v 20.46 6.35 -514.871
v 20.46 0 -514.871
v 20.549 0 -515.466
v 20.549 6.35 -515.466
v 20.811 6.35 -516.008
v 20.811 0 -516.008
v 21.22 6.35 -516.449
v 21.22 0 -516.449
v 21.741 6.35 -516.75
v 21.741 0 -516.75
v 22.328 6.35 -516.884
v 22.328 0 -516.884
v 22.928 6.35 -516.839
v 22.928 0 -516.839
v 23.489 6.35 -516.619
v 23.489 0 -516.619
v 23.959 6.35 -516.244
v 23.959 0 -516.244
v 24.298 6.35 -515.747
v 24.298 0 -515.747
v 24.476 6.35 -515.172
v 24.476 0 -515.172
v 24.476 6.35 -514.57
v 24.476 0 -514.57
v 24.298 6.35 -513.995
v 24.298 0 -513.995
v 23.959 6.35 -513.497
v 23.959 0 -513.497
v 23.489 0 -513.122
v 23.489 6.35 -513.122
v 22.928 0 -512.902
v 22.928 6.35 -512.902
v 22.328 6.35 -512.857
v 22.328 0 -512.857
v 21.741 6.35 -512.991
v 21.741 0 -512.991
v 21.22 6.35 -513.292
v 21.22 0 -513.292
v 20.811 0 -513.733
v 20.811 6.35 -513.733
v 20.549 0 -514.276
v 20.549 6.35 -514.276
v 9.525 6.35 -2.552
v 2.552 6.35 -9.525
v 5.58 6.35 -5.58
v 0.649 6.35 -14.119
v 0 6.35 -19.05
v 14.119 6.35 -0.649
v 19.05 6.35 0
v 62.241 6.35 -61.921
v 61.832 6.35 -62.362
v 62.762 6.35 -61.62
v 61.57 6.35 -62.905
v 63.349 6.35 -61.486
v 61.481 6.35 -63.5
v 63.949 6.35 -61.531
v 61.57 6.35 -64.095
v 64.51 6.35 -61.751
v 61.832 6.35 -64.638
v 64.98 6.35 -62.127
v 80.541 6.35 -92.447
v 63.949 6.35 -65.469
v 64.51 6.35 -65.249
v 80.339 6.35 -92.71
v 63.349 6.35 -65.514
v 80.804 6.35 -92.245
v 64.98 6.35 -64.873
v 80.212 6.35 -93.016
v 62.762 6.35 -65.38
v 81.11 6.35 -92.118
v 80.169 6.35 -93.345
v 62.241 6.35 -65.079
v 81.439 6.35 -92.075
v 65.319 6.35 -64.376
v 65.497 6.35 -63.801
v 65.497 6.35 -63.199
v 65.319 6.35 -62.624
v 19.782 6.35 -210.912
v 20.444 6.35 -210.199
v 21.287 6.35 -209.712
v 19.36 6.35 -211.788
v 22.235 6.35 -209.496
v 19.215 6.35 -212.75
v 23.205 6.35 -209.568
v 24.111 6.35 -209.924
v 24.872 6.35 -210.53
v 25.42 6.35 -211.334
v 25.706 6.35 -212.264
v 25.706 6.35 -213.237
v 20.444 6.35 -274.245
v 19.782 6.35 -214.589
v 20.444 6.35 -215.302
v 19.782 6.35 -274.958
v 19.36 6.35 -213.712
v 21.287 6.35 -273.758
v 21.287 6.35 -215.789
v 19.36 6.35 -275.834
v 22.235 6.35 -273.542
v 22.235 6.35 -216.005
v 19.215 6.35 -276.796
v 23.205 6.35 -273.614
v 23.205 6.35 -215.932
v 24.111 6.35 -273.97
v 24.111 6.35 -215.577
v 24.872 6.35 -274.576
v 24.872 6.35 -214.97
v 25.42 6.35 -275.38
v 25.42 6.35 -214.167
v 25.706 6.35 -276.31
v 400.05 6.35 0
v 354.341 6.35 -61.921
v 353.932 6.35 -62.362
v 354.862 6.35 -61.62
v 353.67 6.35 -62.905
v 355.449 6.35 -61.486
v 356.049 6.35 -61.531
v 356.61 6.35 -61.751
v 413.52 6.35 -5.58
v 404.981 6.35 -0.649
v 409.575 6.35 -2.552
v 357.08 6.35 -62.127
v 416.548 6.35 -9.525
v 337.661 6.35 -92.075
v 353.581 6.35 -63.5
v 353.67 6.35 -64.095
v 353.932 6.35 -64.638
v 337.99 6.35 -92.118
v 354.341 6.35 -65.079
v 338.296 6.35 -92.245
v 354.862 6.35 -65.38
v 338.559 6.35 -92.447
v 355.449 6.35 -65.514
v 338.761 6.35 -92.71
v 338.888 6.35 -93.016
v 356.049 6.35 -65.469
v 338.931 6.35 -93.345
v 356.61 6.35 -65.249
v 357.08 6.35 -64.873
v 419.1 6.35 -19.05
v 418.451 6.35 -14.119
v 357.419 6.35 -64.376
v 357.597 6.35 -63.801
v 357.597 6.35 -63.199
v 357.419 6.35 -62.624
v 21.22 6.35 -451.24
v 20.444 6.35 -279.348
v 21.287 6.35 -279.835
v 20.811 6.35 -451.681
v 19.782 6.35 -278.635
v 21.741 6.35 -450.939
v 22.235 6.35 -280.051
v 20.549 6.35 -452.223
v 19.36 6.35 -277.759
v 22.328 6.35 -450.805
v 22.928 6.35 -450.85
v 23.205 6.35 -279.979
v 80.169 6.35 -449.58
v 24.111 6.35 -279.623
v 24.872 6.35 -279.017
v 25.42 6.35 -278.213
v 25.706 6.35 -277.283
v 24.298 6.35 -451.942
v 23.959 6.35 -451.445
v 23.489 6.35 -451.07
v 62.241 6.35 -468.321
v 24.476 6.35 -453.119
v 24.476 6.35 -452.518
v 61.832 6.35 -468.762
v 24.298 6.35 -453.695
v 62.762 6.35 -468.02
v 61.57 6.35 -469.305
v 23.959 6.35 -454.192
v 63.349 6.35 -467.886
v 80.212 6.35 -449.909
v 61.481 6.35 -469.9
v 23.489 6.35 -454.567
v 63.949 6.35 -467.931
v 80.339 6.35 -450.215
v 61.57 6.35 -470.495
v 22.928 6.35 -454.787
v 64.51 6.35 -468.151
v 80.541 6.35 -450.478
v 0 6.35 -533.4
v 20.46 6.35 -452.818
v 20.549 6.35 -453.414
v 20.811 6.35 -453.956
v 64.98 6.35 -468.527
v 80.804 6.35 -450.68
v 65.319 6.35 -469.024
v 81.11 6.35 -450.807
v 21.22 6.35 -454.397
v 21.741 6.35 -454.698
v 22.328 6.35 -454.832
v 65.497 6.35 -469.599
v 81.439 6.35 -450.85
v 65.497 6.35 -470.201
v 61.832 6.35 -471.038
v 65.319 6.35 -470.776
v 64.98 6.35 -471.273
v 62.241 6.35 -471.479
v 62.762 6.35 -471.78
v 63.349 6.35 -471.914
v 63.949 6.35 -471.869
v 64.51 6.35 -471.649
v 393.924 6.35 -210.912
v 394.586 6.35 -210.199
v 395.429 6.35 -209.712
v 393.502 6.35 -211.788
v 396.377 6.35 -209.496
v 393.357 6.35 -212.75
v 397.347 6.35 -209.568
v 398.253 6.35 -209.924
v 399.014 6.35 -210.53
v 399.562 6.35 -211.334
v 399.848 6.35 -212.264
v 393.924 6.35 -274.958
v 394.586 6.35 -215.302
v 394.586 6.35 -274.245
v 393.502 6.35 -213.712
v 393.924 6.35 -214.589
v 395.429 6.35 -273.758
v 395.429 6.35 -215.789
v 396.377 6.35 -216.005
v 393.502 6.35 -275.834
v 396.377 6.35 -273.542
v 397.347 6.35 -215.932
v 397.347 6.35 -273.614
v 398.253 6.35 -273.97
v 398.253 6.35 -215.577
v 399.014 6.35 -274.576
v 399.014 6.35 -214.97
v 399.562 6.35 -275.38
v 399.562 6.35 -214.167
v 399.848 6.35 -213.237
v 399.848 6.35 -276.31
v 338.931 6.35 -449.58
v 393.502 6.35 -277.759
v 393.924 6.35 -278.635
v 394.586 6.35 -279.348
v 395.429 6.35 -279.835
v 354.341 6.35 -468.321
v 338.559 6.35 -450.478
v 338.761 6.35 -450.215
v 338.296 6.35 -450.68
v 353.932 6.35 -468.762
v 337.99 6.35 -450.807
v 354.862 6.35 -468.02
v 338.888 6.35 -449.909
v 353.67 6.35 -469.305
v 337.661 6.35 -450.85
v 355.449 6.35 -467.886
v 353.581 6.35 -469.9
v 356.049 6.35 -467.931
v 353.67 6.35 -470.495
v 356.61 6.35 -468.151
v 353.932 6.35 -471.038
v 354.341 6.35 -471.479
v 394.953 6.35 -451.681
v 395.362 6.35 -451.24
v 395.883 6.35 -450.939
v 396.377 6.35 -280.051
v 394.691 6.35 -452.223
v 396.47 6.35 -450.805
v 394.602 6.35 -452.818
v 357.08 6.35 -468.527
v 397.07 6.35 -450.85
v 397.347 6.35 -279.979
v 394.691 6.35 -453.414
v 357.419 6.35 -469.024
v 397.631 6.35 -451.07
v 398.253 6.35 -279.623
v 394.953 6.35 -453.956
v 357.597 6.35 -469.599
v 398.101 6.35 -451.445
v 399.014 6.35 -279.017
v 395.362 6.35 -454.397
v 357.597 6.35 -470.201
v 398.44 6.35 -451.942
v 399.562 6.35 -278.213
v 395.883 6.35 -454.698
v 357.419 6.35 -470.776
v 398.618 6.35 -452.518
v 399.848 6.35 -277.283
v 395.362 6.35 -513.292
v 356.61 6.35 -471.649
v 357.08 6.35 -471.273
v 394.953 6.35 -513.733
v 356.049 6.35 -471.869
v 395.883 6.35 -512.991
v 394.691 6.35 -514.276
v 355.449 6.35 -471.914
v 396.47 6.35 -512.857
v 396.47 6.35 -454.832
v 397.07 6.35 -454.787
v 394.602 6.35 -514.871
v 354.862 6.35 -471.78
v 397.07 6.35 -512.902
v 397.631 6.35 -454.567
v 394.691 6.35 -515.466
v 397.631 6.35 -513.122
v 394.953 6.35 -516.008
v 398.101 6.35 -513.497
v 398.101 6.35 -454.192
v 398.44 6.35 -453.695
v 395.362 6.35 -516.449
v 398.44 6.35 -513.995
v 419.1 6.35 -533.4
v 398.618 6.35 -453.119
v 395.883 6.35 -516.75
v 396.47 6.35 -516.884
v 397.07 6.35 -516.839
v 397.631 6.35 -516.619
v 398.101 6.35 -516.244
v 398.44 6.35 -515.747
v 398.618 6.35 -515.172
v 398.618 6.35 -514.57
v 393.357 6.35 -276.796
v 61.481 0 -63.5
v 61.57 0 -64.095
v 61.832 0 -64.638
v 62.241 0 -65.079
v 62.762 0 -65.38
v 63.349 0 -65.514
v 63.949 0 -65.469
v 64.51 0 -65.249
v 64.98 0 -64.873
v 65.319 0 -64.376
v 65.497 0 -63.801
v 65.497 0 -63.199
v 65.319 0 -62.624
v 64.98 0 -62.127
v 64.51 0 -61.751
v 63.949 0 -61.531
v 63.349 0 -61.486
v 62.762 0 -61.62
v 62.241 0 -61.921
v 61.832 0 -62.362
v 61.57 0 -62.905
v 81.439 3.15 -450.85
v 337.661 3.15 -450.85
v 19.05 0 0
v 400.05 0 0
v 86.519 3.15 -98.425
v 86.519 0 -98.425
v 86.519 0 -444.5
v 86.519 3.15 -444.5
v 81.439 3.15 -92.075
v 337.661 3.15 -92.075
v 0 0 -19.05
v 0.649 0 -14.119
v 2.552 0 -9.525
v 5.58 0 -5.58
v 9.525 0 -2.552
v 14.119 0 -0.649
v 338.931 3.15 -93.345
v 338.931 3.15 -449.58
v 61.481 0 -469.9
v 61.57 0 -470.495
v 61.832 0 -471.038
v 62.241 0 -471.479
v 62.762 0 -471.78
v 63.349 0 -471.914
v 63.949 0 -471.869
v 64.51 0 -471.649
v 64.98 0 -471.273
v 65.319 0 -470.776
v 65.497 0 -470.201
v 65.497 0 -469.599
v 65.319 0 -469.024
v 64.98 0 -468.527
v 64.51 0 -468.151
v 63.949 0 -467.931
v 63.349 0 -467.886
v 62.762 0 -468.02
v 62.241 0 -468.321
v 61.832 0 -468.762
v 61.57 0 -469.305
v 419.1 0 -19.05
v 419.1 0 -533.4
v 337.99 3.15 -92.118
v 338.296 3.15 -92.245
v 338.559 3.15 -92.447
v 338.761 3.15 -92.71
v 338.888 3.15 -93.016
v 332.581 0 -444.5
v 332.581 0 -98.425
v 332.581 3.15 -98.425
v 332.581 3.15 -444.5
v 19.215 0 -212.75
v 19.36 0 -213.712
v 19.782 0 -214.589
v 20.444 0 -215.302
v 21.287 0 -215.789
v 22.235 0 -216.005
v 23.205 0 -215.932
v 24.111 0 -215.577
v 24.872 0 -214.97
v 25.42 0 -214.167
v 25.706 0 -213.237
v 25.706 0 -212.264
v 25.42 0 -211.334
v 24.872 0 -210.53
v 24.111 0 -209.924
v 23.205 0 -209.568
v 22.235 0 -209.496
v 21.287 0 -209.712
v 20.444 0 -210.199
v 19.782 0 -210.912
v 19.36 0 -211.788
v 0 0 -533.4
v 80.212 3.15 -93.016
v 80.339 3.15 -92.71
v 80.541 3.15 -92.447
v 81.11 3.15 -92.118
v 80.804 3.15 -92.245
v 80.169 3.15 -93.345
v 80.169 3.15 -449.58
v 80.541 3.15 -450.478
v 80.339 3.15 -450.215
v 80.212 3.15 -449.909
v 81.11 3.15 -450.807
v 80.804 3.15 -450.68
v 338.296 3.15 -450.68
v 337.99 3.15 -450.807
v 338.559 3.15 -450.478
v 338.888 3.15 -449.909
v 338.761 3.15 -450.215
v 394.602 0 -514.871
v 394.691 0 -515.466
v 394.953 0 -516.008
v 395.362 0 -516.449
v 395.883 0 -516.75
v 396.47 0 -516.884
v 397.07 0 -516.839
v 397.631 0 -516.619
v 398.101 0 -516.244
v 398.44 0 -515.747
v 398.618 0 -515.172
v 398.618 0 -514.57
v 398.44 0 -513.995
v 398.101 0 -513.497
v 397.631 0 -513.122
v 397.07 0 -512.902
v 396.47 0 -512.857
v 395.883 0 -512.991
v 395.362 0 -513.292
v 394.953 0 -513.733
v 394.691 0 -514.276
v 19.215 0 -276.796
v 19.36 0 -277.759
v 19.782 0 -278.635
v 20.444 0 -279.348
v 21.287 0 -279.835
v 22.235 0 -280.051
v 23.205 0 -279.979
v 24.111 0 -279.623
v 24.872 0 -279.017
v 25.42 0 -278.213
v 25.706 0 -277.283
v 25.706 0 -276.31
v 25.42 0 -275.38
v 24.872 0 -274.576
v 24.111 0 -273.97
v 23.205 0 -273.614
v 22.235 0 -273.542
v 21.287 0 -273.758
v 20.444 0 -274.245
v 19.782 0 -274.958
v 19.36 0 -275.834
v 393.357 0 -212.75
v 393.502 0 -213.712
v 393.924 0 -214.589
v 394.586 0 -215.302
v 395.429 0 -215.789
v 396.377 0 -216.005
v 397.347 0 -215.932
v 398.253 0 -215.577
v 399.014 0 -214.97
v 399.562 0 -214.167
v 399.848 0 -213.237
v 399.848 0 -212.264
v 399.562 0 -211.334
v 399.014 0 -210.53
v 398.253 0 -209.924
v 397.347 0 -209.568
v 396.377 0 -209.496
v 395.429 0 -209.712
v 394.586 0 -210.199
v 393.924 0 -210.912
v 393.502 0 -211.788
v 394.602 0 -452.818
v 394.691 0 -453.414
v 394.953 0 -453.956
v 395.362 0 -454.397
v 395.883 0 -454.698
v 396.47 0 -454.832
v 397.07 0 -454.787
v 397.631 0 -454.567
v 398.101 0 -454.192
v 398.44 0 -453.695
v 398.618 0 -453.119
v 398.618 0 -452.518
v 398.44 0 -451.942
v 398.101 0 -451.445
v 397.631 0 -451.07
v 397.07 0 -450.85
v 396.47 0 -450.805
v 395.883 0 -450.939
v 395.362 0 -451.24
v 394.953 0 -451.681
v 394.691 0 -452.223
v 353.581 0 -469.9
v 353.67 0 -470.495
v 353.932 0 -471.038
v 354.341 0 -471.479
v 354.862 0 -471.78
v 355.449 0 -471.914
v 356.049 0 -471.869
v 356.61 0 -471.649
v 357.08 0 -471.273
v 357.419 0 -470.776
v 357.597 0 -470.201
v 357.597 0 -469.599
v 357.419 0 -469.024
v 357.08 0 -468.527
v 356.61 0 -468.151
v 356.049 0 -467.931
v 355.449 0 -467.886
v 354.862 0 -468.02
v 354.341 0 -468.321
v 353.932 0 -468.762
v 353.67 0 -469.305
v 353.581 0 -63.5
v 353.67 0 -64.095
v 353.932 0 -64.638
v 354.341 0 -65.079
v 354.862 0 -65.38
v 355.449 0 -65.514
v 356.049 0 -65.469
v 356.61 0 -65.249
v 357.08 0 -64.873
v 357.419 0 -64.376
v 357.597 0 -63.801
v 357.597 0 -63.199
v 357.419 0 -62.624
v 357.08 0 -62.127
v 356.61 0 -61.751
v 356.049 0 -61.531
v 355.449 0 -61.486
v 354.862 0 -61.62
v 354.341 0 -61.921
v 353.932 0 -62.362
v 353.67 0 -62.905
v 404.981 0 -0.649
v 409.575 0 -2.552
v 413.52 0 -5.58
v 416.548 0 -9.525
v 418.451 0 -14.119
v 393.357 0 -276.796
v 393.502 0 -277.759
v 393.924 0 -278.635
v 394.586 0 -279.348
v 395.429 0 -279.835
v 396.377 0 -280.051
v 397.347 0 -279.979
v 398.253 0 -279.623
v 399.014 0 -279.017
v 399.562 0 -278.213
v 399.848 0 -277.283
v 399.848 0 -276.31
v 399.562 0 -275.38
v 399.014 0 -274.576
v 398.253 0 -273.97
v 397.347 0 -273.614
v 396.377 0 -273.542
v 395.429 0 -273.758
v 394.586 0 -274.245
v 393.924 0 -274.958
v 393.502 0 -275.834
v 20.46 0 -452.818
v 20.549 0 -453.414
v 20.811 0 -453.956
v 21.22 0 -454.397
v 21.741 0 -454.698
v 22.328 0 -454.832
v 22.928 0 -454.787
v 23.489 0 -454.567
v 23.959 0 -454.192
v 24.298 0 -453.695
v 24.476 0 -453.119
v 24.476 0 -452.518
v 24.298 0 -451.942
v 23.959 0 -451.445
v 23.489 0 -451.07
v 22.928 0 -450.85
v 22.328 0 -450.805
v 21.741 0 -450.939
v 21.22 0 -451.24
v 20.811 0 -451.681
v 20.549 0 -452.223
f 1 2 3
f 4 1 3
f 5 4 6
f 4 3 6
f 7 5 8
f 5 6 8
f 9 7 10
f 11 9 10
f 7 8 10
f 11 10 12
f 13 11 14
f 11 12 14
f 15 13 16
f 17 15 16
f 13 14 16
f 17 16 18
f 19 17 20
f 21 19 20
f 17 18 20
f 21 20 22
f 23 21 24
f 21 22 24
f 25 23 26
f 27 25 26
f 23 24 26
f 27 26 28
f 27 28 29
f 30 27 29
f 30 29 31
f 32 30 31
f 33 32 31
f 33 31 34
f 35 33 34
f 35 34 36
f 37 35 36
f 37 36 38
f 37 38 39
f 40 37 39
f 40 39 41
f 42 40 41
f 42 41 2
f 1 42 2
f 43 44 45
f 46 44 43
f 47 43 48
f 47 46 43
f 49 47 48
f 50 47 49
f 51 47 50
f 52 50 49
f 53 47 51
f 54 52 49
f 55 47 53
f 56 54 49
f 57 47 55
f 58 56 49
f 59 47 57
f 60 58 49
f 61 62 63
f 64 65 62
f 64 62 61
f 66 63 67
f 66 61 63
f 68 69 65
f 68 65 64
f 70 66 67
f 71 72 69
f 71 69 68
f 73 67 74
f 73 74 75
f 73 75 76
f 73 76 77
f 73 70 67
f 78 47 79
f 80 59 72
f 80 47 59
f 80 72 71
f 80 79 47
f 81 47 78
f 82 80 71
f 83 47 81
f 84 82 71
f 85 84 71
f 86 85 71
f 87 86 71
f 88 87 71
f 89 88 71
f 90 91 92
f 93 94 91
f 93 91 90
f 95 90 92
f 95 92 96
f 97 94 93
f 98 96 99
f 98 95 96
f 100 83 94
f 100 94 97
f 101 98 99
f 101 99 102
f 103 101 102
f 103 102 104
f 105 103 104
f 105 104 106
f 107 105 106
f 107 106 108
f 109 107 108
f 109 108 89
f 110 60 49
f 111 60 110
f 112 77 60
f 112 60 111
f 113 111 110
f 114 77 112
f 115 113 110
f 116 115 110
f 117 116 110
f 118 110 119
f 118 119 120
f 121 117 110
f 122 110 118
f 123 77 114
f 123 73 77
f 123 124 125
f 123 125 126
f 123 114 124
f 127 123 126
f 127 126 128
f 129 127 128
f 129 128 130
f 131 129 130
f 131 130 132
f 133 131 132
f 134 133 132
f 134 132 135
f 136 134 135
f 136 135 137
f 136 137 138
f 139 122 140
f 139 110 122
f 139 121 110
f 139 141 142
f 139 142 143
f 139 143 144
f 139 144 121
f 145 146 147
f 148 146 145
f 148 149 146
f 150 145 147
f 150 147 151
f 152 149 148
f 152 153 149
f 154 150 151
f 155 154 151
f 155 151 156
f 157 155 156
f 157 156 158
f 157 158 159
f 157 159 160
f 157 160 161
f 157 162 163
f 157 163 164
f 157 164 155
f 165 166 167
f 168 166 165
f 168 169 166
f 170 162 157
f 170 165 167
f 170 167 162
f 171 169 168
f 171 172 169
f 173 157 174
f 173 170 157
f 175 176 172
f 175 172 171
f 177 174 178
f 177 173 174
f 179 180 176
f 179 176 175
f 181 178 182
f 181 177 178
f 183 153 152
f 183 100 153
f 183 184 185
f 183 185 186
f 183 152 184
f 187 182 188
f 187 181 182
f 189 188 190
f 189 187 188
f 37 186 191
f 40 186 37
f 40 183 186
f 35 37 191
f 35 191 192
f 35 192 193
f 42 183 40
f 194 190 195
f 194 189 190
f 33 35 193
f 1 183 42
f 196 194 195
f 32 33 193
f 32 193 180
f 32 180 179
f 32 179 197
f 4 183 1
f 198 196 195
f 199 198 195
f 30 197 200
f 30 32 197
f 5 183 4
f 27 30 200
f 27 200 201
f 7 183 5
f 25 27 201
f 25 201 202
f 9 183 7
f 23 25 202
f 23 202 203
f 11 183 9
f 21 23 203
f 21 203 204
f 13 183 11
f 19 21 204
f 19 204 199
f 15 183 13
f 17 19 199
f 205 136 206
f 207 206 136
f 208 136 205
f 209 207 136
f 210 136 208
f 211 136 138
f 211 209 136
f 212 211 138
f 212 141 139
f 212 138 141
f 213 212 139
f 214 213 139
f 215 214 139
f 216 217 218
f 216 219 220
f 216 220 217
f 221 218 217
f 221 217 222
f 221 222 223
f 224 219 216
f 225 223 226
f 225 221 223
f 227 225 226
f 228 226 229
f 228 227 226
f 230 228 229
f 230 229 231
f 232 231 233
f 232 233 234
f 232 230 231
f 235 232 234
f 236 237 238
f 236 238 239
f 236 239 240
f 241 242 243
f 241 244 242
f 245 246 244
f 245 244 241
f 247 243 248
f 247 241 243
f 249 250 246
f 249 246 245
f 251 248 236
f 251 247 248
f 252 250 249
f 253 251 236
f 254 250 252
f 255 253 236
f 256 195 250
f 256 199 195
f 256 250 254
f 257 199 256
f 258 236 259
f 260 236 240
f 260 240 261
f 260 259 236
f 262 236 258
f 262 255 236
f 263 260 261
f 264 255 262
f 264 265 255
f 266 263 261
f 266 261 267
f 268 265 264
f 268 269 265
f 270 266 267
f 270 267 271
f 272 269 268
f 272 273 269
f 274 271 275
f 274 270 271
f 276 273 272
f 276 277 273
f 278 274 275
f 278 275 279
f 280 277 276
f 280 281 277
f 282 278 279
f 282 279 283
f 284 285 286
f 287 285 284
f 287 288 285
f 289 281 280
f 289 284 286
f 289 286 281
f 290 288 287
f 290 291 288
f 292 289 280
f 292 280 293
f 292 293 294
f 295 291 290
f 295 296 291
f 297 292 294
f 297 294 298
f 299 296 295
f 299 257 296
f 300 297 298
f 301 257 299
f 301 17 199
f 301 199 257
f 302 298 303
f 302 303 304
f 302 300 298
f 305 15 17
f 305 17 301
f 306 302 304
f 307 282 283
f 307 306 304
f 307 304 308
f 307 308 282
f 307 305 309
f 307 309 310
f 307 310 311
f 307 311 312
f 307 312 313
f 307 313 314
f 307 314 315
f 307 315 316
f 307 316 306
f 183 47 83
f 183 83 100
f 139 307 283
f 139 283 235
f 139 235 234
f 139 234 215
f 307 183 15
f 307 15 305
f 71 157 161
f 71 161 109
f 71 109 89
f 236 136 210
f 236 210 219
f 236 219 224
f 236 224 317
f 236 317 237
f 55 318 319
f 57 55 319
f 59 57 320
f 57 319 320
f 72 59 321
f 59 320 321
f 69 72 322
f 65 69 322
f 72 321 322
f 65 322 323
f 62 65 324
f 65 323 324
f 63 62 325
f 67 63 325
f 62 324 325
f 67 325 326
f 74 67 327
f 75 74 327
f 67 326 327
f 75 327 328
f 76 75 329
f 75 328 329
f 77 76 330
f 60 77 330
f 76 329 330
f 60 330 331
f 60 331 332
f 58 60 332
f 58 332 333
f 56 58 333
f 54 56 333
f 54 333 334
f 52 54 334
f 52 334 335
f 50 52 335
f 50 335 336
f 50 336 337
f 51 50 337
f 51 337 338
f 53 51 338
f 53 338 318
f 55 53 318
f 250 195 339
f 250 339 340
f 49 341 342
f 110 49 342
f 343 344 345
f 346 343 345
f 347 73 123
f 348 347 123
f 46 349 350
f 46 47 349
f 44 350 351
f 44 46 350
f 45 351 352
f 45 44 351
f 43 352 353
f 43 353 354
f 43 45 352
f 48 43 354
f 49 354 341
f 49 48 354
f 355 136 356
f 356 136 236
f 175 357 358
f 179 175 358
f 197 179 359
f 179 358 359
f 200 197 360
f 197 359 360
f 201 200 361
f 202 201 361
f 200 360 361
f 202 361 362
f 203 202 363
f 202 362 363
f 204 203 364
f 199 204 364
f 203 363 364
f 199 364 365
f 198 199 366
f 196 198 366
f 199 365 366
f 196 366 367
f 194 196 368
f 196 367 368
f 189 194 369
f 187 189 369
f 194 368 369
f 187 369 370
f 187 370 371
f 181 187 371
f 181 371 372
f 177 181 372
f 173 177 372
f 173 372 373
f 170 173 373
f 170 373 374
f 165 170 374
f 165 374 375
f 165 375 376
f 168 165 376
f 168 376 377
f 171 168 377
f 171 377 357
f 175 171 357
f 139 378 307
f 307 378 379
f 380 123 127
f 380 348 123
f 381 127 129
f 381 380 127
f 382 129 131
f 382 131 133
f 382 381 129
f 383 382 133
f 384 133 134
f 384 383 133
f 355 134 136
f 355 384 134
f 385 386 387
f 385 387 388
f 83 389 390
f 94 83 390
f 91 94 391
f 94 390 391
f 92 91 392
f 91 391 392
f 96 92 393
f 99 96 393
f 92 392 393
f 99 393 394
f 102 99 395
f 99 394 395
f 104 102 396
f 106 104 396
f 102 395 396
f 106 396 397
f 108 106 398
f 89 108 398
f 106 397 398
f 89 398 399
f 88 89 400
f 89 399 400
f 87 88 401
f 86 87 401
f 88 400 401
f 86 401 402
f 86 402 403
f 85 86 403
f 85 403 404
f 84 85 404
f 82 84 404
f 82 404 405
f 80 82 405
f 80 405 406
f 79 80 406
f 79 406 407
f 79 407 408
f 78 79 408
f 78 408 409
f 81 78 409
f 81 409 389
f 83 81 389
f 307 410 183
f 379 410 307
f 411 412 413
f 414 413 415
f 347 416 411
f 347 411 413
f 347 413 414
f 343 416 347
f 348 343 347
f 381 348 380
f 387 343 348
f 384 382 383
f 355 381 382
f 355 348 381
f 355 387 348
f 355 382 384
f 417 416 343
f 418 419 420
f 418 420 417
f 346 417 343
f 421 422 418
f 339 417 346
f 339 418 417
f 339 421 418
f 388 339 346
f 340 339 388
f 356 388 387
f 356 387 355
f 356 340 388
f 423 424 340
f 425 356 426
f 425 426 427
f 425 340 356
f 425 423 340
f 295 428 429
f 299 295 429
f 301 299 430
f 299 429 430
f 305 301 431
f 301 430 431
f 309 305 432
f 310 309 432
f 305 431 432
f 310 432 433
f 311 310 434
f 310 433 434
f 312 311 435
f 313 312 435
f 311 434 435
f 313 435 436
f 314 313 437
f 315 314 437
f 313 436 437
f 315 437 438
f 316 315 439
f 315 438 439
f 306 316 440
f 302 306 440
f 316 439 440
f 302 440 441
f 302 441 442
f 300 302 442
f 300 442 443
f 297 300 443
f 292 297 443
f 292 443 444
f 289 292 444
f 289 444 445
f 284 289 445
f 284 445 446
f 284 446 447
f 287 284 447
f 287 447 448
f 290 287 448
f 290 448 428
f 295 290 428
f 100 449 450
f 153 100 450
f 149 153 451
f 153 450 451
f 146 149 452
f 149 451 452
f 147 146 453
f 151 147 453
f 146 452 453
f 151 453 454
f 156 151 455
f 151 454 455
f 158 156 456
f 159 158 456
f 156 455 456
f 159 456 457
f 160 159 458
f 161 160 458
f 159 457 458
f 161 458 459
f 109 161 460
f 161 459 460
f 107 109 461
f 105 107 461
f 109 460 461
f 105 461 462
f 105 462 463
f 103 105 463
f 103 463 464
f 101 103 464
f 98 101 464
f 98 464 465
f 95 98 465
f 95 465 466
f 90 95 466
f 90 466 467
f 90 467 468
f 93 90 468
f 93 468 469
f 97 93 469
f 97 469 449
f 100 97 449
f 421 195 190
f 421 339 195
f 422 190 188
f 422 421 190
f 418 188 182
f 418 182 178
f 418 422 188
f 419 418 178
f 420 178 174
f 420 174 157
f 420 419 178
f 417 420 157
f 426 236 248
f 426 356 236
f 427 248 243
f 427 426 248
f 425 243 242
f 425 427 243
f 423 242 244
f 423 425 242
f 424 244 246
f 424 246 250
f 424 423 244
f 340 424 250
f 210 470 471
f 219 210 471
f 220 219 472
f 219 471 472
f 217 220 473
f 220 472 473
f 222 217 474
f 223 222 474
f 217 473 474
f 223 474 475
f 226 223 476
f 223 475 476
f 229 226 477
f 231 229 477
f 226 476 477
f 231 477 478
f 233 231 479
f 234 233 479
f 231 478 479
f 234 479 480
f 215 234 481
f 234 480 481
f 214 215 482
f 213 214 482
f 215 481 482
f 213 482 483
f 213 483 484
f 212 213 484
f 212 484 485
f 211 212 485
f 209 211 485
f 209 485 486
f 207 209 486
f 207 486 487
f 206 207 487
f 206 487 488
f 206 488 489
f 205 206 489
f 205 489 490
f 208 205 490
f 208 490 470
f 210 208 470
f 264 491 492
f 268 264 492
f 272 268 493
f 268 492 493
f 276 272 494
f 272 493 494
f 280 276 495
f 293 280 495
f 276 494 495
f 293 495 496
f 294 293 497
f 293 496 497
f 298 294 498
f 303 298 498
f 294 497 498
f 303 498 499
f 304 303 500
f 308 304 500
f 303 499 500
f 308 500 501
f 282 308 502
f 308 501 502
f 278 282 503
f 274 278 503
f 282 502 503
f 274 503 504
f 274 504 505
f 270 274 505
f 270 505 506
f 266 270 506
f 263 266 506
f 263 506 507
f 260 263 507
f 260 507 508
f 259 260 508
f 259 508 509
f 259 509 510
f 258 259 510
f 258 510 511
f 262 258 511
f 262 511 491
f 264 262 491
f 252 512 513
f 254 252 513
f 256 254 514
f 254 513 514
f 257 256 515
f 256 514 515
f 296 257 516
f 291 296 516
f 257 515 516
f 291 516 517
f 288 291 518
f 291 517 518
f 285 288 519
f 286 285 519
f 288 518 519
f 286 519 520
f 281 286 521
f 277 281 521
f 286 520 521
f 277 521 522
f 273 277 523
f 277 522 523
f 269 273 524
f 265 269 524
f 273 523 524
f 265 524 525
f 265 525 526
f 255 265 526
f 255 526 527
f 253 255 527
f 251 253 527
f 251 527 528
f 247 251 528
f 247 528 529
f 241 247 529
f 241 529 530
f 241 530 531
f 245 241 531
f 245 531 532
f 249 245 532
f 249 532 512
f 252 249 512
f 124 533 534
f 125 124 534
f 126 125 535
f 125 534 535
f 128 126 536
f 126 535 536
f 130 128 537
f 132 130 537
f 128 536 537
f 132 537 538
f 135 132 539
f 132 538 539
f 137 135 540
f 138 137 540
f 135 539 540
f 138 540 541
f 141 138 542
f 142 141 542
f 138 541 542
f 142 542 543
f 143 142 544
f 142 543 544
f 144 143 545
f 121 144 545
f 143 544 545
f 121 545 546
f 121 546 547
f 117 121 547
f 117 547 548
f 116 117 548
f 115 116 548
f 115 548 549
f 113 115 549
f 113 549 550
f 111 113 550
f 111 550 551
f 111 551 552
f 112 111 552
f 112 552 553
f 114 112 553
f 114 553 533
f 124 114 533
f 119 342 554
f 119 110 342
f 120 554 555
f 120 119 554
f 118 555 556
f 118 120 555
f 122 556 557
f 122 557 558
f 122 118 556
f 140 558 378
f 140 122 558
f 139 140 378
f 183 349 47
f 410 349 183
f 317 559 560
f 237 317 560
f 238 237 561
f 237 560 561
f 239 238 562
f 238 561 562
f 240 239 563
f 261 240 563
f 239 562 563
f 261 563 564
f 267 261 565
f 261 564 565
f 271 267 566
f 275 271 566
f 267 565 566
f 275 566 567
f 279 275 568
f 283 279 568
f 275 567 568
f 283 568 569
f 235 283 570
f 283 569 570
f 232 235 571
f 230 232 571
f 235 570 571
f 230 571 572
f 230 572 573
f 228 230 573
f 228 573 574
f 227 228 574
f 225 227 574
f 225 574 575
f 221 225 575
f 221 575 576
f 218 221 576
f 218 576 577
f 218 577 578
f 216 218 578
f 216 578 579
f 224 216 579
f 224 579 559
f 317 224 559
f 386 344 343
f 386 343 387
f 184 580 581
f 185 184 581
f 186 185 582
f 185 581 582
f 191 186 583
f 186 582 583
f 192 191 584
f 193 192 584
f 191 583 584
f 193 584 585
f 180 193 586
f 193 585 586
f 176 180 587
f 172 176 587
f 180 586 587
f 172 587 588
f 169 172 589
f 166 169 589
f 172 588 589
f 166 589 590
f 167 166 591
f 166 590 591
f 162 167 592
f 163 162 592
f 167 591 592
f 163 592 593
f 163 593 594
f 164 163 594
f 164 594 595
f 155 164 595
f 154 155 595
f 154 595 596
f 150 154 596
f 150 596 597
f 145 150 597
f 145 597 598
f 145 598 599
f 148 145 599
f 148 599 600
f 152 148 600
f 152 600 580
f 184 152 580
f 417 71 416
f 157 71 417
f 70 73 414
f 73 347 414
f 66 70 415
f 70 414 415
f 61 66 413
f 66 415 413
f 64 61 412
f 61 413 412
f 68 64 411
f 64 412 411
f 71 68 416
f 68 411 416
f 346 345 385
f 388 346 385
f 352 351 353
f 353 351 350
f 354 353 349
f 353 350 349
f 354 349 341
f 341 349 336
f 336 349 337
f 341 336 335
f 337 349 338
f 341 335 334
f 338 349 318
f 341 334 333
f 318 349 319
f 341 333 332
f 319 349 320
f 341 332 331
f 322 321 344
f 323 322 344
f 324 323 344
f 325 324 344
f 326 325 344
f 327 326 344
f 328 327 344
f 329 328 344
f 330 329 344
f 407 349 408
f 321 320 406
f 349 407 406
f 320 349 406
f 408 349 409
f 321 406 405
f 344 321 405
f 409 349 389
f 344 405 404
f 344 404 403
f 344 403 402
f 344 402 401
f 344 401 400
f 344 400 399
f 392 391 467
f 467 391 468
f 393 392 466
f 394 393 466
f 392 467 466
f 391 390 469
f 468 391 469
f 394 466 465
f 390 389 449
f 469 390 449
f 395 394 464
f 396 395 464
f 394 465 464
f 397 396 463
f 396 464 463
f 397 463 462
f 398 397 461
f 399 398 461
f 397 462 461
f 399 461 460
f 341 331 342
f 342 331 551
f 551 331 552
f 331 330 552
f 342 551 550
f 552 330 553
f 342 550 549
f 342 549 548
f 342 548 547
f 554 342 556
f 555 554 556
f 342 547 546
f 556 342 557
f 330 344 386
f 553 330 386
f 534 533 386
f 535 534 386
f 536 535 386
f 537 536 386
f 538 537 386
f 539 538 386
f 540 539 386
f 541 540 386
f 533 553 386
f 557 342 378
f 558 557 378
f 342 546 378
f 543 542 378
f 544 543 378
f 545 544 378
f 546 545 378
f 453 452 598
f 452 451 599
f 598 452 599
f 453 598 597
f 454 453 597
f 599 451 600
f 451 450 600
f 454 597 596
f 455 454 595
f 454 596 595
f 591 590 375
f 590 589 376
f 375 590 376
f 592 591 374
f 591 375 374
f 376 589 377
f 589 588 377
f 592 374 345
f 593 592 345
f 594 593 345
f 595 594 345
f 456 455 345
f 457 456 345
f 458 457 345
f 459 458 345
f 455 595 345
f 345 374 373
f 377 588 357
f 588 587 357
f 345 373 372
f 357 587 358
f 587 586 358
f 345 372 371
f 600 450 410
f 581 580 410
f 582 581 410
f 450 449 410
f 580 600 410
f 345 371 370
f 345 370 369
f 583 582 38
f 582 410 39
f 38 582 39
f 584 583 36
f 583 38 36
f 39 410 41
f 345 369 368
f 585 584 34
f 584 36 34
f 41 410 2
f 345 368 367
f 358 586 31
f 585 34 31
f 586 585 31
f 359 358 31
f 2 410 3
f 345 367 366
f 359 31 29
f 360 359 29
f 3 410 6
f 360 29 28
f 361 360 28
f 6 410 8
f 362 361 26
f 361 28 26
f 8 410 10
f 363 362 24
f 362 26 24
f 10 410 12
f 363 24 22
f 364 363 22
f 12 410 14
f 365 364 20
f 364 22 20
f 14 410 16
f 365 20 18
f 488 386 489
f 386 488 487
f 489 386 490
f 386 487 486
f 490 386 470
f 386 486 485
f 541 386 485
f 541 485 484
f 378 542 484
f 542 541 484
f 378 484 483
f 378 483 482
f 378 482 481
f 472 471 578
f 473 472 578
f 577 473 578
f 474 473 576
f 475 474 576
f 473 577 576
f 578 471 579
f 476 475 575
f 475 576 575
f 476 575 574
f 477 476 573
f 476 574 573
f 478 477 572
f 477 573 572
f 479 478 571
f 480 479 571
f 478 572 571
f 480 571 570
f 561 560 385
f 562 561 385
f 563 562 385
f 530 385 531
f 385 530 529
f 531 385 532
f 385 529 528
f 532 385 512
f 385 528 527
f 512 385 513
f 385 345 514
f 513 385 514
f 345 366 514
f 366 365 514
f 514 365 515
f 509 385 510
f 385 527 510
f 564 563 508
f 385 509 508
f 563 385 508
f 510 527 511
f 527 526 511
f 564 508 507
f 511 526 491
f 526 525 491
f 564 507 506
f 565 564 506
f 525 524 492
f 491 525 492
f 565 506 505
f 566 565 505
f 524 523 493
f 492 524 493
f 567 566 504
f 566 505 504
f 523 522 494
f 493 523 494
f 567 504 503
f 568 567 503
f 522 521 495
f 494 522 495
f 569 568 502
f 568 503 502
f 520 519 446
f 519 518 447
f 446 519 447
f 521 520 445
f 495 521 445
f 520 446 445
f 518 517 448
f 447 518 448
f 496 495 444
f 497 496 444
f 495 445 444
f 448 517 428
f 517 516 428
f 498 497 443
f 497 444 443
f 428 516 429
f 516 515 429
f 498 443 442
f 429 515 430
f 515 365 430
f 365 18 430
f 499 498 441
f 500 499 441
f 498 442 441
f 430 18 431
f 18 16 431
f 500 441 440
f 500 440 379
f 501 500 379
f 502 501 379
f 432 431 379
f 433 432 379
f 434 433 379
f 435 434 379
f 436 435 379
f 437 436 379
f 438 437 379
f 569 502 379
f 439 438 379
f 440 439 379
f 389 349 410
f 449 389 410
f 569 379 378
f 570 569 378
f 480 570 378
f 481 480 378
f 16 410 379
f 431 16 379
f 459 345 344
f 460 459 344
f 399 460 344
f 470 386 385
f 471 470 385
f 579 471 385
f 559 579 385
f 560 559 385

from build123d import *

# Parameters (mm, degrees)
SKETCH1_W                    = 419.1
SKETCH1_H                    = 533.4
SKETCH1_W_2                  = 246.0625
SKETCH1_H_2                  = 346.075
OVERALL_SHAPE_DEPTH          = 6.35
SKETCH5_W                    = 258.7625
SKETCH5_H                    = 358.775
GLASS_INSET_CUT_DEPTH        = 3.19999995
GLASS_INSET_FILLETS_R        = 1.27
FILLET1_R                    = 19.05
F_10_32_TAPPED_HOLE3_D       = 4.0386
F_10_32_TAPPED_HOLE3_DEPTH   = 6.35
F_10_32_TAPPED_HOLE7_D       = 4.0386
F_10_32_TAPPED_HOLE7_DEPTH   = 6.35
F_5_16_18_TAPPED_HOLE1_D     = 6.5278
F_5_16_18_TAPPED_HOLE1_DEPTH = 6.35


with BuildPart() as part:
    # Sketch1 → Overall shape (new body)
    with BuildSketch(Plane(origin=(0, 0, 0), x_dir=(1, 0, 0), z_dir=(0, 1, 0))):
        with Locations((209.55, 266.7)):
            Rectangle(SKETCH1_W, SKETCH1_H)
        with Locations((209.55, 271.4625)):
            Rectangle(SKETCH1_W_2, SKETCH1_H_2, mode=Mode.SUBTRACT)
    extrude(amount=OVERALL_SHAPE_DEPTH)

    # Sketch5 → Glass inset cut (cut)
    with BuildSketch(Plane(origin=(0, 6.35, 0), x_dir=(1, 0, 0), z_dir=(0, 1, 0))):
        with Locations((209.55, 271.4625)):
            Rectangle(SKETCH5_W, SKETCH5_H)
    extrude(amount=-GLASS_INSET_CUT_DEPTH, mode=Mode.SUBTRACT)

    # Glass inset fillets
    glass_inset_fillets_edges = [part.edges().sort_by_distance(p)[0] for p in [
        (80.16875, 4.750000025, -92.075),
        (80.16875, 4.750000025, -450.85),
        (338.93125, 4.750000025, -450.85),
        (338.93125, 4.750000025, -92.075),
    ]]
    fillet(glass_inset_fillets_edges, radius=GLASS_INSET_FILLETS_R)

    # Fillet1
    fillet1_edges = [part.edges().sort_by_distance(p)[0] for p in [
        (419.1, 3.175, 0),
        (0, 3.175, 0),
    ]]
    fillet(fillet1_edges, radius=FILLET1_R)

    # #10-32 Tapped Hole3
    with Locations(Plane(origin=(0, 6.35, 0), x_dir=(1, 0, 0), z_dir=(0, 1, 0))):
        with Locations((63.5, 469.9), (355.6, 469.9), (355.6, 63.5), (63.5, 63.5)):
            Hole(F_10_32_TAPPED_HOLE3_D / 2, depth=F_10_32_TAPPED_HOLE3_DEPTH)

    # #10-32 Tapped Hole7
    with Locations(Plane(origin=(0, 6.35, 0), x_dir=(1, 0, 0), z_dir=(0, 1, 0))):
        with Locations((22.479, 514.8707), (22.479, 452.8185), (396.621, 514.8707), (396.621, 452.8185)):
            Hole(F_10_32_TAPPED_HOLE7_D / 2, depth=F_10_32_TAPPED_HOLE7_DEPTH)

    # 5/16-18 Tapped Hole1
    with Locations(Plane(origin=(0, 6.35, 0), x_dir=(1, 0, 0), z_dir=(0, 1, 0))):
        with Locations((22.479, 276.7965), (22.479, 212.7504), (396.621, 276.7965), (396.621, 212.7504)):
            Hole(F_5_16_18_TAPPED_HOLE1_D / 2, depth=F_5_16_18_TAPPED_HOLE1_DEPTH)


solid = part.part
